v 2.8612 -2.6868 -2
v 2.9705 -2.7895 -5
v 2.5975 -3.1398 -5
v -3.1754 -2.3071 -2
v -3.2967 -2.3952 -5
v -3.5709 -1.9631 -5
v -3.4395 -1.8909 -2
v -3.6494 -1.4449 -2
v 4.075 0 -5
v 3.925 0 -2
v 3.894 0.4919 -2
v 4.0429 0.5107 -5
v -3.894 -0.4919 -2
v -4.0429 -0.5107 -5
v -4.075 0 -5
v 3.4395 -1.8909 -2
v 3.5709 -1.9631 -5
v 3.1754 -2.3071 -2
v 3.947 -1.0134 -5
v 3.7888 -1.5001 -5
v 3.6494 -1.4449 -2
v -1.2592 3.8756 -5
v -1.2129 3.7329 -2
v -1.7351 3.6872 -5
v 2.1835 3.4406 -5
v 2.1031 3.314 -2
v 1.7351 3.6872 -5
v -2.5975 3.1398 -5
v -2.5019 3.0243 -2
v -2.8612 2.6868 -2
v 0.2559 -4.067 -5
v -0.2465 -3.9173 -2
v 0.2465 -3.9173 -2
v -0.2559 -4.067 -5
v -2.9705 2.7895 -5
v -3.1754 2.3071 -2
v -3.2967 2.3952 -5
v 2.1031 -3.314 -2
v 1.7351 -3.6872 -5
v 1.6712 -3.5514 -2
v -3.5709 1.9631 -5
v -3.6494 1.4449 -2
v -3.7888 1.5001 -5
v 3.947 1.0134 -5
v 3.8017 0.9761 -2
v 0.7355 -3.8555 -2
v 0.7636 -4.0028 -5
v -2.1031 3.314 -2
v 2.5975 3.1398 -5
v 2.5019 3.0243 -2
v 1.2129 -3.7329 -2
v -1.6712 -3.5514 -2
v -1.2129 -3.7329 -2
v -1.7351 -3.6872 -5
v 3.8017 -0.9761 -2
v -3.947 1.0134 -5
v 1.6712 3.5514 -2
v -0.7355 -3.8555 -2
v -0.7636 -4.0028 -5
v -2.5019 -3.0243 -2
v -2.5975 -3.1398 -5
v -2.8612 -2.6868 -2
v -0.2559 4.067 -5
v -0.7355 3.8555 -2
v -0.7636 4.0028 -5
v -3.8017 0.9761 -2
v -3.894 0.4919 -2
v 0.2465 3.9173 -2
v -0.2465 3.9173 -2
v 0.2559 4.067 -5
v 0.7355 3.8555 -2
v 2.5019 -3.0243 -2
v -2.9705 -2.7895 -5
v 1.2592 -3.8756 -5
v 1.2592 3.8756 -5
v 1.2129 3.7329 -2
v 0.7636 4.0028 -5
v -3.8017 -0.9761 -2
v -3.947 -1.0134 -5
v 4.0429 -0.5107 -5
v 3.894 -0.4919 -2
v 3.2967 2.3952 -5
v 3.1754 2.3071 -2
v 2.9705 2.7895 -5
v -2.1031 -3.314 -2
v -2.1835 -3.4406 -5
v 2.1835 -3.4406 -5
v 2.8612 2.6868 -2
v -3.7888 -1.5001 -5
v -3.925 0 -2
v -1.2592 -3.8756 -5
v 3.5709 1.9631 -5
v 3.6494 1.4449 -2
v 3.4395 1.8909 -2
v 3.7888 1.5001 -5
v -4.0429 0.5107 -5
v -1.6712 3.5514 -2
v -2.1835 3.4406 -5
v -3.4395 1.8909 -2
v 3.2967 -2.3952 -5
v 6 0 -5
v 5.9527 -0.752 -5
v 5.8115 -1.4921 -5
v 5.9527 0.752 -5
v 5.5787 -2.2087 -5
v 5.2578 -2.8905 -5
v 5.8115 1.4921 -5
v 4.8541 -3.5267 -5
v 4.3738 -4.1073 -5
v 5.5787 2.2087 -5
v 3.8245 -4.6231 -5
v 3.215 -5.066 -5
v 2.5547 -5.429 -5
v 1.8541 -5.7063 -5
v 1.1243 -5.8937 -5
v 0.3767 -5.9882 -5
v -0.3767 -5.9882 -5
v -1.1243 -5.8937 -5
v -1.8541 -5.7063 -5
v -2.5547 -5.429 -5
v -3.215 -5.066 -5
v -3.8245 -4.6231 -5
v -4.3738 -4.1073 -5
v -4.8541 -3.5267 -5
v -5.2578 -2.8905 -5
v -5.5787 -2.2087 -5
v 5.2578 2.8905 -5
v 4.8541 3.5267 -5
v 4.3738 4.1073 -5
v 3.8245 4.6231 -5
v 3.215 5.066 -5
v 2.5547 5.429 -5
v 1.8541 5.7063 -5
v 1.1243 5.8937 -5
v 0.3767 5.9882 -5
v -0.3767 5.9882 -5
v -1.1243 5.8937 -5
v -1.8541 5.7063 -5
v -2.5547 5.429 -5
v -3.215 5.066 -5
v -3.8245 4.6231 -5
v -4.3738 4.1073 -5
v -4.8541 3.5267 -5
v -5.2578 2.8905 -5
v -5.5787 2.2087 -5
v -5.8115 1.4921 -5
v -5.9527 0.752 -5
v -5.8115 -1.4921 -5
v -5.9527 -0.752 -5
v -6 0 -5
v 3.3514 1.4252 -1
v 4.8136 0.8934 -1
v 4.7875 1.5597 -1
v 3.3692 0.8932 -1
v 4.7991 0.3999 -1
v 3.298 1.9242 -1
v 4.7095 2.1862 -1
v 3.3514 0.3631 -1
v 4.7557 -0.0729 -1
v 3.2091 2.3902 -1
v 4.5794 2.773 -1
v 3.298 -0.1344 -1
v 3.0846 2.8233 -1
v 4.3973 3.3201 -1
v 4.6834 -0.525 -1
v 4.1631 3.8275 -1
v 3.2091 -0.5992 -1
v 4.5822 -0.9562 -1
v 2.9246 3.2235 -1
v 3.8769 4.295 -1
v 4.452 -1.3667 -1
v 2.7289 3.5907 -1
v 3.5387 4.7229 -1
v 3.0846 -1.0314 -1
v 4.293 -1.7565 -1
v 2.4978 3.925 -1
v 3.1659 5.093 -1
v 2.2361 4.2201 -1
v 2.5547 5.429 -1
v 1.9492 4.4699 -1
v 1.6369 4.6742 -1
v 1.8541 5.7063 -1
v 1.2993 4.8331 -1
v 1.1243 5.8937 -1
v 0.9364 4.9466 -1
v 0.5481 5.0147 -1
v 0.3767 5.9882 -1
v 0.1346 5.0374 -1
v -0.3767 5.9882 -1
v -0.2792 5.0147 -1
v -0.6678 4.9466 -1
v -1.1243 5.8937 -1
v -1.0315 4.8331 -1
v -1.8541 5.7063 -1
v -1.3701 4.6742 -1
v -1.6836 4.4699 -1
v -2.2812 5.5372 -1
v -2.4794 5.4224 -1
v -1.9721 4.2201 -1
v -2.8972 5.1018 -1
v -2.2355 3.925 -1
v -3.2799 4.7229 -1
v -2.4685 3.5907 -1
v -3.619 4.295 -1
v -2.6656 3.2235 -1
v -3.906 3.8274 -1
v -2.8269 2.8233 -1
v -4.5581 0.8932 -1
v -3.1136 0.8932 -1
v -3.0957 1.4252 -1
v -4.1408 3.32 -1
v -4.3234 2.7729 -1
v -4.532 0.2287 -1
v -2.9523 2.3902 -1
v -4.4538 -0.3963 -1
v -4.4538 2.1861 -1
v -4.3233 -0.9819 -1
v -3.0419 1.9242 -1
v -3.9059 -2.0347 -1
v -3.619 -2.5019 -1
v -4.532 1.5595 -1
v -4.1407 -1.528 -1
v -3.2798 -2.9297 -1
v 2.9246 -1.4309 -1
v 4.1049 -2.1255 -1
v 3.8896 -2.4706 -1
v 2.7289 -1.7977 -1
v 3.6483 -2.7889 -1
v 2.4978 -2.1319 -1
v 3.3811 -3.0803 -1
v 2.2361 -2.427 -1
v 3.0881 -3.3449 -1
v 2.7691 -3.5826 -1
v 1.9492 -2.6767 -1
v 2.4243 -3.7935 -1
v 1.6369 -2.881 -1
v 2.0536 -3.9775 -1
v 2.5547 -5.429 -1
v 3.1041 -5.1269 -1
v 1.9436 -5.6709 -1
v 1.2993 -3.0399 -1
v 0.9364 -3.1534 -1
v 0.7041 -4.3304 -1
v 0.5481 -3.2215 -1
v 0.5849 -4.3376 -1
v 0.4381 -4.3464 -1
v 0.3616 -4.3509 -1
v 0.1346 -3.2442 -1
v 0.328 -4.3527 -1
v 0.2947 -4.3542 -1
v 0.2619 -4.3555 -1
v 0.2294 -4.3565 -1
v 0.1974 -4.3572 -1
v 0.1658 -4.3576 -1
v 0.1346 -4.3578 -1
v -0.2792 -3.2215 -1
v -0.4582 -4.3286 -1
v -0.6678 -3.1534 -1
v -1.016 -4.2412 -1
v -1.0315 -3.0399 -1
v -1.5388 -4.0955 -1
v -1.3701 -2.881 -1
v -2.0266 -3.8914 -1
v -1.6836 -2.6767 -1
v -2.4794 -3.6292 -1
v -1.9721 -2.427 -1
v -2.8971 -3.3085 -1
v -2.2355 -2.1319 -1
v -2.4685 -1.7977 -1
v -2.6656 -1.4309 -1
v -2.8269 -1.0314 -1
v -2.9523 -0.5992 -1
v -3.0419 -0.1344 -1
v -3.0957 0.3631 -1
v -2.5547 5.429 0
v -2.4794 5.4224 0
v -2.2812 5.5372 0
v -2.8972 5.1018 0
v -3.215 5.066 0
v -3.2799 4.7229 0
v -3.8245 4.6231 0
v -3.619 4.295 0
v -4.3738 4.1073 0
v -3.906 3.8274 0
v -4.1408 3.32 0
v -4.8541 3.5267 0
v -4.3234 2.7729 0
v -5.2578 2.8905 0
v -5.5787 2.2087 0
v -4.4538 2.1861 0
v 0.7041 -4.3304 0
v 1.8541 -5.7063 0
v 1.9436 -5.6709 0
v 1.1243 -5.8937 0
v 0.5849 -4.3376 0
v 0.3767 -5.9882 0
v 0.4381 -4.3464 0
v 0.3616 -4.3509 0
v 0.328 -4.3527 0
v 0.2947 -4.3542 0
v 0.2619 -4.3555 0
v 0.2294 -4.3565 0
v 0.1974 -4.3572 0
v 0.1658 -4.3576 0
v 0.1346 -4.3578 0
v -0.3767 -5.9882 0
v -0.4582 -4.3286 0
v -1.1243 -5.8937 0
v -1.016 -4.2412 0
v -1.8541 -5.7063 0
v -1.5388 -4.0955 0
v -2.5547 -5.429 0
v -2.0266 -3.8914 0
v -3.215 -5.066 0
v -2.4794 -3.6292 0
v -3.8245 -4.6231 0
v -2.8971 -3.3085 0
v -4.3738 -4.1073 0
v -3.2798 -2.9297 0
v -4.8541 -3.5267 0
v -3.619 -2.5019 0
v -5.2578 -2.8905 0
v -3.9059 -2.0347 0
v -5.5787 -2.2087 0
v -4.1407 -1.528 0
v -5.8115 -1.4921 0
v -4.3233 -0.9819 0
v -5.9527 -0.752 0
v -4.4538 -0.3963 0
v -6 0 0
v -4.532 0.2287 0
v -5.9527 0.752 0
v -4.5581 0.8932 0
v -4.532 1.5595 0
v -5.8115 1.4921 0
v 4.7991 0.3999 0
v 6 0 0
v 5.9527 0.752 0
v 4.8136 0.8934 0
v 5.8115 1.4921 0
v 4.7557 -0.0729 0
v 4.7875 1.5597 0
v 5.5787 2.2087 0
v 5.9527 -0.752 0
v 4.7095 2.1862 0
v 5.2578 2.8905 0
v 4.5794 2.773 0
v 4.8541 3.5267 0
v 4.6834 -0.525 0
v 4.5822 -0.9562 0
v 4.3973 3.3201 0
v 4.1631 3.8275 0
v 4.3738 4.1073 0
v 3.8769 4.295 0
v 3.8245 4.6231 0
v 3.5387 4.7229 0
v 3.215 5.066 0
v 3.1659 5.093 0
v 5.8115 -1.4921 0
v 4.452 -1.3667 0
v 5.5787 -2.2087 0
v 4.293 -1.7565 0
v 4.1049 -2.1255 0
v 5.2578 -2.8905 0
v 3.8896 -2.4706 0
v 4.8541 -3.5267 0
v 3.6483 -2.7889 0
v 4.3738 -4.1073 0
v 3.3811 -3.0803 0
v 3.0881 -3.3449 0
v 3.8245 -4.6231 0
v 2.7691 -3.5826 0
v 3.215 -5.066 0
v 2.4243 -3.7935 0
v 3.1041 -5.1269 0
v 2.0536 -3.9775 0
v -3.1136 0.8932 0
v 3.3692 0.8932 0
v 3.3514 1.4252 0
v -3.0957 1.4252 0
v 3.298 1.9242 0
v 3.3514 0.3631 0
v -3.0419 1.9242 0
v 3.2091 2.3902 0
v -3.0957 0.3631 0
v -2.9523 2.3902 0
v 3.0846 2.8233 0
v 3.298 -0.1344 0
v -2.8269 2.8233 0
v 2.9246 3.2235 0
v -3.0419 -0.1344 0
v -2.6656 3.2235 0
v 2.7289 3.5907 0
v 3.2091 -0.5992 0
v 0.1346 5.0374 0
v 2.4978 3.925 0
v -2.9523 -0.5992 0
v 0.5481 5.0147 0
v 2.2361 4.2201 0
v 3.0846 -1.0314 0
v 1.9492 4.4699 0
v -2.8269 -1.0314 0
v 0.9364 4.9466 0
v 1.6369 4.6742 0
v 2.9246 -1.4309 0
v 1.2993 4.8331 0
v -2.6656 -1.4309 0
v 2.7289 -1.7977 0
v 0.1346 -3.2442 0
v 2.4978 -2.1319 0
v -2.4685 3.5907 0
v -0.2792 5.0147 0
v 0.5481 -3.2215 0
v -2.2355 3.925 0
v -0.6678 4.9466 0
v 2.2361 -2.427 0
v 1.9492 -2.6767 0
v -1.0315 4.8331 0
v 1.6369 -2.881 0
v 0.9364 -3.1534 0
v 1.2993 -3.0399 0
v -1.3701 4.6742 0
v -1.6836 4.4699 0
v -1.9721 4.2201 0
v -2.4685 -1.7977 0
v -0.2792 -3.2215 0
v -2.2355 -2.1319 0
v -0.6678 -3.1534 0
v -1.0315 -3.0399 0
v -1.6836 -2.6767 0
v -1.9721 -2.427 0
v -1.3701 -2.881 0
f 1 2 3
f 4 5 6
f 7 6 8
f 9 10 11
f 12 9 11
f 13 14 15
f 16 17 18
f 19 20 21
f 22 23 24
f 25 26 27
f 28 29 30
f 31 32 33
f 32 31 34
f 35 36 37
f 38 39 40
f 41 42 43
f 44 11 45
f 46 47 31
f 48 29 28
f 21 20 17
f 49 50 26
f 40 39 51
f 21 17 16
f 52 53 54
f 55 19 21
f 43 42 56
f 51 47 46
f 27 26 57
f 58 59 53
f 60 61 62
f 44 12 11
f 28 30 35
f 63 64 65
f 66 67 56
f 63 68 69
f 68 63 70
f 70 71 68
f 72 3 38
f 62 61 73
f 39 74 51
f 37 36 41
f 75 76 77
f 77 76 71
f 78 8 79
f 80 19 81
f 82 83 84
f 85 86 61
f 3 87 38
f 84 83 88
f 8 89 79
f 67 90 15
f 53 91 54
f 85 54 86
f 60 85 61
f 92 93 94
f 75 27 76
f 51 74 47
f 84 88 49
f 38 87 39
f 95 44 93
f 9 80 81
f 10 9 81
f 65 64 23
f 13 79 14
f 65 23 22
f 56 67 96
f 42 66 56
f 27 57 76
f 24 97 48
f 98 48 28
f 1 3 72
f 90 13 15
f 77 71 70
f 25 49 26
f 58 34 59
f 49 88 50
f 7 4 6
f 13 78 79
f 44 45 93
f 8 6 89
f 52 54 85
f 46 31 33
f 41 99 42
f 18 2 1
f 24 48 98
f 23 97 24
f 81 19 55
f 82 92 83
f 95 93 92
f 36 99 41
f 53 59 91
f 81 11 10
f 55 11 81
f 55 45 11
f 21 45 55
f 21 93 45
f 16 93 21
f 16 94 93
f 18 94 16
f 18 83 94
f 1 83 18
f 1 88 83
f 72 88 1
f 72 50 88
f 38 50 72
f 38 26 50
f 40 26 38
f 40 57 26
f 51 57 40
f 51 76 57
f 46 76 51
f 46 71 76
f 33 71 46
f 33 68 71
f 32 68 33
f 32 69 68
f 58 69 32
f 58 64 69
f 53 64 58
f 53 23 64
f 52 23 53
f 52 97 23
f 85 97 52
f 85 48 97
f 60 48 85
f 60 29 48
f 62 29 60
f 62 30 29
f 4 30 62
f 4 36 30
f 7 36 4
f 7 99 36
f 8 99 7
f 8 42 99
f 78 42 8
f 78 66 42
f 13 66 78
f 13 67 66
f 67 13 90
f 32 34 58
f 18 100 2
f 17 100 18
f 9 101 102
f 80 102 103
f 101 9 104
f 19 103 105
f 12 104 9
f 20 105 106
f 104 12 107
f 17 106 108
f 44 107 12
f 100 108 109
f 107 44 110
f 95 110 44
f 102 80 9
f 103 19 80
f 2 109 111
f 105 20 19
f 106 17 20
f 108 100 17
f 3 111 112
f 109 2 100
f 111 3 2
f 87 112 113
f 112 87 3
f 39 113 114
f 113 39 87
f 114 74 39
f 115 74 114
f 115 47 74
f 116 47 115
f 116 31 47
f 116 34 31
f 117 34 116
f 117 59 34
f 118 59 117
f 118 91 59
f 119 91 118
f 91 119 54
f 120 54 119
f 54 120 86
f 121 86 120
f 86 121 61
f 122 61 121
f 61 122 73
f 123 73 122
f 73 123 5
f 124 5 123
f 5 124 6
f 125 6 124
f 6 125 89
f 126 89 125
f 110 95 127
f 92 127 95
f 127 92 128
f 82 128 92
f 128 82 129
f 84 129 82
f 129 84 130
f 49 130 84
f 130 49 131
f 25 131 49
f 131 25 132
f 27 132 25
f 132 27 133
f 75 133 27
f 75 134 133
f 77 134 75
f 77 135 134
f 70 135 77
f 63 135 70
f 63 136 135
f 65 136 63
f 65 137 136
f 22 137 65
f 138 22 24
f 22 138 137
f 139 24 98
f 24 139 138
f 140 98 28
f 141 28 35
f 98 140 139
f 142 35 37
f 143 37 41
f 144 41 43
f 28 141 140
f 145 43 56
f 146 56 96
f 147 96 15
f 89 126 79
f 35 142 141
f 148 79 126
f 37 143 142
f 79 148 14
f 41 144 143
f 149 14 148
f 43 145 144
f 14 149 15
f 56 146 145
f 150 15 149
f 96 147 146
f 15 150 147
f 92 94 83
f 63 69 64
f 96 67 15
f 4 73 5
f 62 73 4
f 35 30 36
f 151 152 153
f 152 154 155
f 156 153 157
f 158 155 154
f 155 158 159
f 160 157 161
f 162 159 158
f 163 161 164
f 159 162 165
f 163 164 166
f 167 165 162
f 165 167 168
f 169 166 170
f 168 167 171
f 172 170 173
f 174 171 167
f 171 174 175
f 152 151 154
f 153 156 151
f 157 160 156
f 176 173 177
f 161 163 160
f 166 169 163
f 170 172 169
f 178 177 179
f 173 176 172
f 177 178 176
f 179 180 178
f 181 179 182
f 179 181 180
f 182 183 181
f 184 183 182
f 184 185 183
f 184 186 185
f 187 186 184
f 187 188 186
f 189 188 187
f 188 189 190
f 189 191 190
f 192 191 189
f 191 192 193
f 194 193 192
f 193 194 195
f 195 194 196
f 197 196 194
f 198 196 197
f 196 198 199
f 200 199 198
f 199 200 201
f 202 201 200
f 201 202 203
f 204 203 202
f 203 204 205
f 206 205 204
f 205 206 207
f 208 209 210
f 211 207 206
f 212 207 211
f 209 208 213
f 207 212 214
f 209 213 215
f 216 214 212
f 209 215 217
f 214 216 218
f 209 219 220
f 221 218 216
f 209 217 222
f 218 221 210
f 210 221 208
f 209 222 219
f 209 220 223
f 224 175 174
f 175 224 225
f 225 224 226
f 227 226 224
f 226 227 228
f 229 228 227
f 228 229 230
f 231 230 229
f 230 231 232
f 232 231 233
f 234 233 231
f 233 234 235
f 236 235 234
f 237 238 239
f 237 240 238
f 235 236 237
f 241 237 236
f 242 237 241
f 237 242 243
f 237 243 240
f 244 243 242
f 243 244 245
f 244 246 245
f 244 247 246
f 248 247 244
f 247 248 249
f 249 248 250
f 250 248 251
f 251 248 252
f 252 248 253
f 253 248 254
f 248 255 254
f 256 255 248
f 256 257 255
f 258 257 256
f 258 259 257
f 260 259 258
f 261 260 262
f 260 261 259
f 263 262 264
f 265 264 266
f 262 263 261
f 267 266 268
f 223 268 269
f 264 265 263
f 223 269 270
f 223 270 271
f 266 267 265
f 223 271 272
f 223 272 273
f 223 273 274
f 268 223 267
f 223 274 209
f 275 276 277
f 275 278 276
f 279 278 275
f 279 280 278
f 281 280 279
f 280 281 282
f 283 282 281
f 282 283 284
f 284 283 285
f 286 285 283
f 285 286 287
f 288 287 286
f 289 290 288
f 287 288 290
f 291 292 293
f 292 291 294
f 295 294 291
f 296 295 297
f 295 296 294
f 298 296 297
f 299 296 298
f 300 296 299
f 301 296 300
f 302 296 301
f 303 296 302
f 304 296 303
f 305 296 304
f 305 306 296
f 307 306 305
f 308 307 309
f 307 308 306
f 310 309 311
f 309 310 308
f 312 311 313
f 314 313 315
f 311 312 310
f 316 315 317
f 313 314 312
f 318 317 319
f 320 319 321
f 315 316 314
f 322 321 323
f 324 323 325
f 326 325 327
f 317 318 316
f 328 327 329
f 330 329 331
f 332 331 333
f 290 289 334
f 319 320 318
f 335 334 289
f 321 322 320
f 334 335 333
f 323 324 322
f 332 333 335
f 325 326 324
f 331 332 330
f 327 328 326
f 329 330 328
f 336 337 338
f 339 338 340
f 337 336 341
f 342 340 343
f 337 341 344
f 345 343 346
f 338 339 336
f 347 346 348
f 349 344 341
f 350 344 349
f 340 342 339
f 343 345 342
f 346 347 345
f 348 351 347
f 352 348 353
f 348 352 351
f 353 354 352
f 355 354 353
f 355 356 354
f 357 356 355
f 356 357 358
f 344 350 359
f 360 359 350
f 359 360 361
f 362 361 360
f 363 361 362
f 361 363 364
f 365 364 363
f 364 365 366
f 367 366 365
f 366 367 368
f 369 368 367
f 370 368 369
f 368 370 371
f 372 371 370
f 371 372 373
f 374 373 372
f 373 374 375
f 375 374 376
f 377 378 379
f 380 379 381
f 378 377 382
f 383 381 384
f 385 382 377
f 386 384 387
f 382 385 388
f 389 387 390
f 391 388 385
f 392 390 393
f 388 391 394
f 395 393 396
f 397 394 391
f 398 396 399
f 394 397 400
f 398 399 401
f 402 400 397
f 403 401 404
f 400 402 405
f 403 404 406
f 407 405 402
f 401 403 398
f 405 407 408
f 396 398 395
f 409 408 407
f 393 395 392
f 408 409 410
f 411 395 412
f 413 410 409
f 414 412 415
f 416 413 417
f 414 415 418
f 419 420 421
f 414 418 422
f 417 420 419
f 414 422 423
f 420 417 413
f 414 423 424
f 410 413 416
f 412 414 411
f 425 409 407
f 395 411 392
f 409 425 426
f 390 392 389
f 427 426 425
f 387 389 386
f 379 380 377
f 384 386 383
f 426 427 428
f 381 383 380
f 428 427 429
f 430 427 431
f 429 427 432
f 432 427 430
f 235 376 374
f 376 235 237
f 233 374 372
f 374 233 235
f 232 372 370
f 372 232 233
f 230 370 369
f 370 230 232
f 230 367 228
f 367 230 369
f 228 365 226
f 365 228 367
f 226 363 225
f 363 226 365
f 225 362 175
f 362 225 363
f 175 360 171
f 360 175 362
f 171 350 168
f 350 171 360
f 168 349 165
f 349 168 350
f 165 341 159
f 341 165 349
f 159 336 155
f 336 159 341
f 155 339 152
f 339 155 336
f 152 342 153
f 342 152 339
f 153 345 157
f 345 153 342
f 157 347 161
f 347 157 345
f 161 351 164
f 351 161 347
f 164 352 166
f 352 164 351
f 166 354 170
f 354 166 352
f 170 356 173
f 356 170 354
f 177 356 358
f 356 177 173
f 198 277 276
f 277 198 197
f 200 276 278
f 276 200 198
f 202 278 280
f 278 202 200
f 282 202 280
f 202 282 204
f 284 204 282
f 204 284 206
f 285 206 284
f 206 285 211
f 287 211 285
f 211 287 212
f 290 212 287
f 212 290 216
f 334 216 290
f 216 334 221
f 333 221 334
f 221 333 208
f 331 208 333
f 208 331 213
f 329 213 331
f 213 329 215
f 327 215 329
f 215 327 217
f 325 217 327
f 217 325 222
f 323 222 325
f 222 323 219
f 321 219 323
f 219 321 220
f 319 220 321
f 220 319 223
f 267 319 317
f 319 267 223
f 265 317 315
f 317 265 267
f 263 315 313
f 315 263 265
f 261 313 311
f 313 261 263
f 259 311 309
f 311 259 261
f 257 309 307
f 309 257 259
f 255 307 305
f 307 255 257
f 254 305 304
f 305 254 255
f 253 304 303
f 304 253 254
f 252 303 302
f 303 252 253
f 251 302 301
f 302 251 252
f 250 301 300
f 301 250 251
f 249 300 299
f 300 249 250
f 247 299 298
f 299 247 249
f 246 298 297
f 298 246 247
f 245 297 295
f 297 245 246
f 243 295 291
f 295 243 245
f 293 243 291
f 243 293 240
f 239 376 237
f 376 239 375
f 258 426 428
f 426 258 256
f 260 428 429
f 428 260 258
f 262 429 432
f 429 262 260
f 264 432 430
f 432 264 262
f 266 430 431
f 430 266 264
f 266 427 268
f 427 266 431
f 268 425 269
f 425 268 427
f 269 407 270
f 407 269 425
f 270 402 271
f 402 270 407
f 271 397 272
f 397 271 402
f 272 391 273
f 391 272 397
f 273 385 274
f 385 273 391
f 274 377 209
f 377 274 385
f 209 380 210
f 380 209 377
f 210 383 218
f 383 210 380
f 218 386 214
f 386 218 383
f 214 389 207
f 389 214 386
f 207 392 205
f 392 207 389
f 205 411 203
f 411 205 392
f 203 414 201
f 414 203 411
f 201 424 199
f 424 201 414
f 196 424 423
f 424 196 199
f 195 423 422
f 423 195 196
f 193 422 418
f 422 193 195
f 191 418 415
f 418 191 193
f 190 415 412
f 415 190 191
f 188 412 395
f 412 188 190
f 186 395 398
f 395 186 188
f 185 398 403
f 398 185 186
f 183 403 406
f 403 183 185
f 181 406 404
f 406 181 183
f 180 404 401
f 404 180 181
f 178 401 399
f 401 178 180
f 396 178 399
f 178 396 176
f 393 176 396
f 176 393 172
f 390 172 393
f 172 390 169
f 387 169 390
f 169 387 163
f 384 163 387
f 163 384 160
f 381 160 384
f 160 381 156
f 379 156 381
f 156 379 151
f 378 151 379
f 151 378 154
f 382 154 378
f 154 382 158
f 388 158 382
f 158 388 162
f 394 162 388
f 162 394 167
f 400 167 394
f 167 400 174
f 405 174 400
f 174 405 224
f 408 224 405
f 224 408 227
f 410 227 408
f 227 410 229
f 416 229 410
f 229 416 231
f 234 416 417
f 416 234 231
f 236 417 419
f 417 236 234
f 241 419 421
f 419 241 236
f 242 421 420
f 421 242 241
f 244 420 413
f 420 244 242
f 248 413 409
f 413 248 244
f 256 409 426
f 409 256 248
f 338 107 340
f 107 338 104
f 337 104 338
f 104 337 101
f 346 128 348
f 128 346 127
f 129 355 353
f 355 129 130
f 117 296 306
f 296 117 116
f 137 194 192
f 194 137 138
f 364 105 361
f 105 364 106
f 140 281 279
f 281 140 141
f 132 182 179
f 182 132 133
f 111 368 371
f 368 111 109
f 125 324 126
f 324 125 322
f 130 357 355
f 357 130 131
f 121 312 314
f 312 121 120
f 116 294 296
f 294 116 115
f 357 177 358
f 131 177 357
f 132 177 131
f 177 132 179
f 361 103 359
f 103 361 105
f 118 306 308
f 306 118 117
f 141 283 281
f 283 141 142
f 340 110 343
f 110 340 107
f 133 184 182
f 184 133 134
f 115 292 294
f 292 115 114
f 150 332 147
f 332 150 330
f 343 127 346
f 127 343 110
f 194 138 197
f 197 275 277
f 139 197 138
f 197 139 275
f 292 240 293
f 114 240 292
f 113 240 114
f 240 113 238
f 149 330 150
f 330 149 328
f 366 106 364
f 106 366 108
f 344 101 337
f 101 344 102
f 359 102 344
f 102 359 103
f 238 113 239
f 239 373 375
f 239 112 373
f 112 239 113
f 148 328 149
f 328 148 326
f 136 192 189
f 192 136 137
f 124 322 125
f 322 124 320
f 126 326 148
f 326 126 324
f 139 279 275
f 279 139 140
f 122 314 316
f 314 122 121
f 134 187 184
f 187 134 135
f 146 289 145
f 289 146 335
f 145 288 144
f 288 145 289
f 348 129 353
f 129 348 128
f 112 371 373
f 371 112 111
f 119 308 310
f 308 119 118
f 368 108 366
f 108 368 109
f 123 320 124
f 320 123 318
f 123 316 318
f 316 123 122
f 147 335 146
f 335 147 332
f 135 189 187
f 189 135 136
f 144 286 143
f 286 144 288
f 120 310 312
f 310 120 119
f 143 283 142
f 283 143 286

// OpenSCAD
$fn = 50;

difference() {
	union() {
		translate(v = [0, 0, -5.0]) {
			cylinder(h = 5, r = 6.0);
		}
	}
	union() {
		#translate(v = [0, 0, -5.0]) {
			cylinder(h = 3, r1 = 4.075, r2 = 3.925);
		}
		translate(v = [0, 0, -1]) {
			linear_extrude(height = 1) {
				text(font = "Impact", halign = "center", size = 10, text = "Q", valign = "center");
			}
		}
	}
}
